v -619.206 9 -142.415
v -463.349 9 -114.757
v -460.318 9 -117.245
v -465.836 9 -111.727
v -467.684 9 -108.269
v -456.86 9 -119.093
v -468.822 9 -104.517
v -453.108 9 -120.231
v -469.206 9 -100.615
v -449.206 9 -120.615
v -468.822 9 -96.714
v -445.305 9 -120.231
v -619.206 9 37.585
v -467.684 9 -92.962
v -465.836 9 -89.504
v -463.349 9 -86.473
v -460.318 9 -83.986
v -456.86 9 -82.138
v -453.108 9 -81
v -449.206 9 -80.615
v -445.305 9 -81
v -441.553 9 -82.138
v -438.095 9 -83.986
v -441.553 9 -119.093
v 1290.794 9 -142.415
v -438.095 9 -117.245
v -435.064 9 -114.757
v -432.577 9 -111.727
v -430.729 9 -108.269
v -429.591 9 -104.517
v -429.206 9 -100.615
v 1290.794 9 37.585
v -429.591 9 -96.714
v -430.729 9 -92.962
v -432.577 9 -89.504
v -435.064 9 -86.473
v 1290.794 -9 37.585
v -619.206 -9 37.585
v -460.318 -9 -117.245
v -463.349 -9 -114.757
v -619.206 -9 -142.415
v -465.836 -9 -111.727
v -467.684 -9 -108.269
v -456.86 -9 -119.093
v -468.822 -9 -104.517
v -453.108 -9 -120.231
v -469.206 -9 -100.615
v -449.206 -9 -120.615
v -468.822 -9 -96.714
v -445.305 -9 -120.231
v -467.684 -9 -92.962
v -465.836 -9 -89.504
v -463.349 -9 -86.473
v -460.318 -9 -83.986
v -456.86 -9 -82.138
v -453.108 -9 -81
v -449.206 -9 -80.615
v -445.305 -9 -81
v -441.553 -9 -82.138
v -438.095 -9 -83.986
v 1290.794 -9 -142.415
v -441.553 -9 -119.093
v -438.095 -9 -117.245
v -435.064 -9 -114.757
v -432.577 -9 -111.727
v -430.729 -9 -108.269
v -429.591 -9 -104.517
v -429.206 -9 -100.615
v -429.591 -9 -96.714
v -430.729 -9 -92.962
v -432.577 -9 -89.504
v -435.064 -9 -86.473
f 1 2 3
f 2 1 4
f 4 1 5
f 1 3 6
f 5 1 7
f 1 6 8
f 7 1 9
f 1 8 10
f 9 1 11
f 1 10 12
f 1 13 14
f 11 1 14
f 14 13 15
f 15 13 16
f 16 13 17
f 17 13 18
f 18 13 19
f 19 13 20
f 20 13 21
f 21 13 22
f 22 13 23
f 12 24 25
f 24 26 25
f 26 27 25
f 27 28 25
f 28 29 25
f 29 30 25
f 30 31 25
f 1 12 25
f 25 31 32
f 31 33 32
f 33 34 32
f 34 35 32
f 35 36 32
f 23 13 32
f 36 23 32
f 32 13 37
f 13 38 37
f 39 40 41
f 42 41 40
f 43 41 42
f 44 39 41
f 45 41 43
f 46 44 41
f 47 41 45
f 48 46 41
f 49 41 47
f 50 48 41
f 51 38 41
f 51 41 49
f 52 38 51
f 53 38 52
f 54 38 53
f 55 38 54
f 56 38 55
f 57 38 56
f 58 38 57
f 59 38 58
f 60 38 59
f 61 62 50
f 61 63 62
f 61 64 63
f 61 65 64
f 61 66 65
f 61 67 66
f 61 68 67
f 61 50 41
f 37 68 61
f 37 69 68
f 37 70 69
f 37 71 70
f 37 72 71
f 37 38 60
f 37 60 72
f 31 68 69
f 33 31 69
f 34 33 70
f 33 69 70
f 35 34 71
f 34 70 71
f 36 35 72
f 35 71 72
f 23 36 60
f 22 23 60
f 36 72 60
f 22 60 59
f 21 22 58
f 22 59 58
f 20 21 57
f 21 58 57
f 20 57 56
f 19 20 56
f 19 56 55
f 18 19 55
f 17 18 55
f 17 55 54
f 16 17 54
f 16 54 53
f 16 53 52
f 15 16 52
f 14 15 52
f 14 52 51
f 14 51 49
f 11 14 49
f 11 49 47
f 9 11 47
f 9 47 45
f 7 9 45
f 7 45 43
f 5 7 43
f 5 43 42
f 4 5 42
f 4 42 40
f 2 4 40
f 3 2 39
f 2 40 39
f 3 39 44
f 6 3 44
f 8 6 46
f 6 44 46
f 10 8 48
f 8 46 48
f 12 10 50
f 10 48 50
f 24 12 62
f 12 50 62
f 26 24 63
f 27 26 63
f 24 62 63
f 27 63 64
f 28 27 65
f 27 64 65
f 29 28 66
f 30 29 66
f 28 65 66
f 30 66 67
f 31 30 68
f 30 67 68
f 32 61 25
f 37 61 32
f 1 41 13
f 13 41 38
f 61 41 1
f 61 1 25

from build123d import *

# Parameters (mm, degrees)
F0_W     = 1910
F0_H     = 180
F1_DEPTH = 9
F2_R     = 20
F3_DEPTH = 25


with BuildPart() as f1:
    # F0 (on Front) → F1 (new body, symmetric)
    with BuildSketch(Plane.XZ):
        with Locations((335.793609, -52.415333)):
            Rectangle(F0_W, F0_H)
    extrude(amount=F1_DEPTH, both=True)

    # F2 (on face) → F3 (cut)
    with BuildSketch(Plane.XZ.offset(9)):
        with Locations((-449.206391, -100.615333)):
            Circle(F2_R)
    extrude(amount=-F3_DEPTH, mode=Mode.SUBTRACT)


solid = f1.part
